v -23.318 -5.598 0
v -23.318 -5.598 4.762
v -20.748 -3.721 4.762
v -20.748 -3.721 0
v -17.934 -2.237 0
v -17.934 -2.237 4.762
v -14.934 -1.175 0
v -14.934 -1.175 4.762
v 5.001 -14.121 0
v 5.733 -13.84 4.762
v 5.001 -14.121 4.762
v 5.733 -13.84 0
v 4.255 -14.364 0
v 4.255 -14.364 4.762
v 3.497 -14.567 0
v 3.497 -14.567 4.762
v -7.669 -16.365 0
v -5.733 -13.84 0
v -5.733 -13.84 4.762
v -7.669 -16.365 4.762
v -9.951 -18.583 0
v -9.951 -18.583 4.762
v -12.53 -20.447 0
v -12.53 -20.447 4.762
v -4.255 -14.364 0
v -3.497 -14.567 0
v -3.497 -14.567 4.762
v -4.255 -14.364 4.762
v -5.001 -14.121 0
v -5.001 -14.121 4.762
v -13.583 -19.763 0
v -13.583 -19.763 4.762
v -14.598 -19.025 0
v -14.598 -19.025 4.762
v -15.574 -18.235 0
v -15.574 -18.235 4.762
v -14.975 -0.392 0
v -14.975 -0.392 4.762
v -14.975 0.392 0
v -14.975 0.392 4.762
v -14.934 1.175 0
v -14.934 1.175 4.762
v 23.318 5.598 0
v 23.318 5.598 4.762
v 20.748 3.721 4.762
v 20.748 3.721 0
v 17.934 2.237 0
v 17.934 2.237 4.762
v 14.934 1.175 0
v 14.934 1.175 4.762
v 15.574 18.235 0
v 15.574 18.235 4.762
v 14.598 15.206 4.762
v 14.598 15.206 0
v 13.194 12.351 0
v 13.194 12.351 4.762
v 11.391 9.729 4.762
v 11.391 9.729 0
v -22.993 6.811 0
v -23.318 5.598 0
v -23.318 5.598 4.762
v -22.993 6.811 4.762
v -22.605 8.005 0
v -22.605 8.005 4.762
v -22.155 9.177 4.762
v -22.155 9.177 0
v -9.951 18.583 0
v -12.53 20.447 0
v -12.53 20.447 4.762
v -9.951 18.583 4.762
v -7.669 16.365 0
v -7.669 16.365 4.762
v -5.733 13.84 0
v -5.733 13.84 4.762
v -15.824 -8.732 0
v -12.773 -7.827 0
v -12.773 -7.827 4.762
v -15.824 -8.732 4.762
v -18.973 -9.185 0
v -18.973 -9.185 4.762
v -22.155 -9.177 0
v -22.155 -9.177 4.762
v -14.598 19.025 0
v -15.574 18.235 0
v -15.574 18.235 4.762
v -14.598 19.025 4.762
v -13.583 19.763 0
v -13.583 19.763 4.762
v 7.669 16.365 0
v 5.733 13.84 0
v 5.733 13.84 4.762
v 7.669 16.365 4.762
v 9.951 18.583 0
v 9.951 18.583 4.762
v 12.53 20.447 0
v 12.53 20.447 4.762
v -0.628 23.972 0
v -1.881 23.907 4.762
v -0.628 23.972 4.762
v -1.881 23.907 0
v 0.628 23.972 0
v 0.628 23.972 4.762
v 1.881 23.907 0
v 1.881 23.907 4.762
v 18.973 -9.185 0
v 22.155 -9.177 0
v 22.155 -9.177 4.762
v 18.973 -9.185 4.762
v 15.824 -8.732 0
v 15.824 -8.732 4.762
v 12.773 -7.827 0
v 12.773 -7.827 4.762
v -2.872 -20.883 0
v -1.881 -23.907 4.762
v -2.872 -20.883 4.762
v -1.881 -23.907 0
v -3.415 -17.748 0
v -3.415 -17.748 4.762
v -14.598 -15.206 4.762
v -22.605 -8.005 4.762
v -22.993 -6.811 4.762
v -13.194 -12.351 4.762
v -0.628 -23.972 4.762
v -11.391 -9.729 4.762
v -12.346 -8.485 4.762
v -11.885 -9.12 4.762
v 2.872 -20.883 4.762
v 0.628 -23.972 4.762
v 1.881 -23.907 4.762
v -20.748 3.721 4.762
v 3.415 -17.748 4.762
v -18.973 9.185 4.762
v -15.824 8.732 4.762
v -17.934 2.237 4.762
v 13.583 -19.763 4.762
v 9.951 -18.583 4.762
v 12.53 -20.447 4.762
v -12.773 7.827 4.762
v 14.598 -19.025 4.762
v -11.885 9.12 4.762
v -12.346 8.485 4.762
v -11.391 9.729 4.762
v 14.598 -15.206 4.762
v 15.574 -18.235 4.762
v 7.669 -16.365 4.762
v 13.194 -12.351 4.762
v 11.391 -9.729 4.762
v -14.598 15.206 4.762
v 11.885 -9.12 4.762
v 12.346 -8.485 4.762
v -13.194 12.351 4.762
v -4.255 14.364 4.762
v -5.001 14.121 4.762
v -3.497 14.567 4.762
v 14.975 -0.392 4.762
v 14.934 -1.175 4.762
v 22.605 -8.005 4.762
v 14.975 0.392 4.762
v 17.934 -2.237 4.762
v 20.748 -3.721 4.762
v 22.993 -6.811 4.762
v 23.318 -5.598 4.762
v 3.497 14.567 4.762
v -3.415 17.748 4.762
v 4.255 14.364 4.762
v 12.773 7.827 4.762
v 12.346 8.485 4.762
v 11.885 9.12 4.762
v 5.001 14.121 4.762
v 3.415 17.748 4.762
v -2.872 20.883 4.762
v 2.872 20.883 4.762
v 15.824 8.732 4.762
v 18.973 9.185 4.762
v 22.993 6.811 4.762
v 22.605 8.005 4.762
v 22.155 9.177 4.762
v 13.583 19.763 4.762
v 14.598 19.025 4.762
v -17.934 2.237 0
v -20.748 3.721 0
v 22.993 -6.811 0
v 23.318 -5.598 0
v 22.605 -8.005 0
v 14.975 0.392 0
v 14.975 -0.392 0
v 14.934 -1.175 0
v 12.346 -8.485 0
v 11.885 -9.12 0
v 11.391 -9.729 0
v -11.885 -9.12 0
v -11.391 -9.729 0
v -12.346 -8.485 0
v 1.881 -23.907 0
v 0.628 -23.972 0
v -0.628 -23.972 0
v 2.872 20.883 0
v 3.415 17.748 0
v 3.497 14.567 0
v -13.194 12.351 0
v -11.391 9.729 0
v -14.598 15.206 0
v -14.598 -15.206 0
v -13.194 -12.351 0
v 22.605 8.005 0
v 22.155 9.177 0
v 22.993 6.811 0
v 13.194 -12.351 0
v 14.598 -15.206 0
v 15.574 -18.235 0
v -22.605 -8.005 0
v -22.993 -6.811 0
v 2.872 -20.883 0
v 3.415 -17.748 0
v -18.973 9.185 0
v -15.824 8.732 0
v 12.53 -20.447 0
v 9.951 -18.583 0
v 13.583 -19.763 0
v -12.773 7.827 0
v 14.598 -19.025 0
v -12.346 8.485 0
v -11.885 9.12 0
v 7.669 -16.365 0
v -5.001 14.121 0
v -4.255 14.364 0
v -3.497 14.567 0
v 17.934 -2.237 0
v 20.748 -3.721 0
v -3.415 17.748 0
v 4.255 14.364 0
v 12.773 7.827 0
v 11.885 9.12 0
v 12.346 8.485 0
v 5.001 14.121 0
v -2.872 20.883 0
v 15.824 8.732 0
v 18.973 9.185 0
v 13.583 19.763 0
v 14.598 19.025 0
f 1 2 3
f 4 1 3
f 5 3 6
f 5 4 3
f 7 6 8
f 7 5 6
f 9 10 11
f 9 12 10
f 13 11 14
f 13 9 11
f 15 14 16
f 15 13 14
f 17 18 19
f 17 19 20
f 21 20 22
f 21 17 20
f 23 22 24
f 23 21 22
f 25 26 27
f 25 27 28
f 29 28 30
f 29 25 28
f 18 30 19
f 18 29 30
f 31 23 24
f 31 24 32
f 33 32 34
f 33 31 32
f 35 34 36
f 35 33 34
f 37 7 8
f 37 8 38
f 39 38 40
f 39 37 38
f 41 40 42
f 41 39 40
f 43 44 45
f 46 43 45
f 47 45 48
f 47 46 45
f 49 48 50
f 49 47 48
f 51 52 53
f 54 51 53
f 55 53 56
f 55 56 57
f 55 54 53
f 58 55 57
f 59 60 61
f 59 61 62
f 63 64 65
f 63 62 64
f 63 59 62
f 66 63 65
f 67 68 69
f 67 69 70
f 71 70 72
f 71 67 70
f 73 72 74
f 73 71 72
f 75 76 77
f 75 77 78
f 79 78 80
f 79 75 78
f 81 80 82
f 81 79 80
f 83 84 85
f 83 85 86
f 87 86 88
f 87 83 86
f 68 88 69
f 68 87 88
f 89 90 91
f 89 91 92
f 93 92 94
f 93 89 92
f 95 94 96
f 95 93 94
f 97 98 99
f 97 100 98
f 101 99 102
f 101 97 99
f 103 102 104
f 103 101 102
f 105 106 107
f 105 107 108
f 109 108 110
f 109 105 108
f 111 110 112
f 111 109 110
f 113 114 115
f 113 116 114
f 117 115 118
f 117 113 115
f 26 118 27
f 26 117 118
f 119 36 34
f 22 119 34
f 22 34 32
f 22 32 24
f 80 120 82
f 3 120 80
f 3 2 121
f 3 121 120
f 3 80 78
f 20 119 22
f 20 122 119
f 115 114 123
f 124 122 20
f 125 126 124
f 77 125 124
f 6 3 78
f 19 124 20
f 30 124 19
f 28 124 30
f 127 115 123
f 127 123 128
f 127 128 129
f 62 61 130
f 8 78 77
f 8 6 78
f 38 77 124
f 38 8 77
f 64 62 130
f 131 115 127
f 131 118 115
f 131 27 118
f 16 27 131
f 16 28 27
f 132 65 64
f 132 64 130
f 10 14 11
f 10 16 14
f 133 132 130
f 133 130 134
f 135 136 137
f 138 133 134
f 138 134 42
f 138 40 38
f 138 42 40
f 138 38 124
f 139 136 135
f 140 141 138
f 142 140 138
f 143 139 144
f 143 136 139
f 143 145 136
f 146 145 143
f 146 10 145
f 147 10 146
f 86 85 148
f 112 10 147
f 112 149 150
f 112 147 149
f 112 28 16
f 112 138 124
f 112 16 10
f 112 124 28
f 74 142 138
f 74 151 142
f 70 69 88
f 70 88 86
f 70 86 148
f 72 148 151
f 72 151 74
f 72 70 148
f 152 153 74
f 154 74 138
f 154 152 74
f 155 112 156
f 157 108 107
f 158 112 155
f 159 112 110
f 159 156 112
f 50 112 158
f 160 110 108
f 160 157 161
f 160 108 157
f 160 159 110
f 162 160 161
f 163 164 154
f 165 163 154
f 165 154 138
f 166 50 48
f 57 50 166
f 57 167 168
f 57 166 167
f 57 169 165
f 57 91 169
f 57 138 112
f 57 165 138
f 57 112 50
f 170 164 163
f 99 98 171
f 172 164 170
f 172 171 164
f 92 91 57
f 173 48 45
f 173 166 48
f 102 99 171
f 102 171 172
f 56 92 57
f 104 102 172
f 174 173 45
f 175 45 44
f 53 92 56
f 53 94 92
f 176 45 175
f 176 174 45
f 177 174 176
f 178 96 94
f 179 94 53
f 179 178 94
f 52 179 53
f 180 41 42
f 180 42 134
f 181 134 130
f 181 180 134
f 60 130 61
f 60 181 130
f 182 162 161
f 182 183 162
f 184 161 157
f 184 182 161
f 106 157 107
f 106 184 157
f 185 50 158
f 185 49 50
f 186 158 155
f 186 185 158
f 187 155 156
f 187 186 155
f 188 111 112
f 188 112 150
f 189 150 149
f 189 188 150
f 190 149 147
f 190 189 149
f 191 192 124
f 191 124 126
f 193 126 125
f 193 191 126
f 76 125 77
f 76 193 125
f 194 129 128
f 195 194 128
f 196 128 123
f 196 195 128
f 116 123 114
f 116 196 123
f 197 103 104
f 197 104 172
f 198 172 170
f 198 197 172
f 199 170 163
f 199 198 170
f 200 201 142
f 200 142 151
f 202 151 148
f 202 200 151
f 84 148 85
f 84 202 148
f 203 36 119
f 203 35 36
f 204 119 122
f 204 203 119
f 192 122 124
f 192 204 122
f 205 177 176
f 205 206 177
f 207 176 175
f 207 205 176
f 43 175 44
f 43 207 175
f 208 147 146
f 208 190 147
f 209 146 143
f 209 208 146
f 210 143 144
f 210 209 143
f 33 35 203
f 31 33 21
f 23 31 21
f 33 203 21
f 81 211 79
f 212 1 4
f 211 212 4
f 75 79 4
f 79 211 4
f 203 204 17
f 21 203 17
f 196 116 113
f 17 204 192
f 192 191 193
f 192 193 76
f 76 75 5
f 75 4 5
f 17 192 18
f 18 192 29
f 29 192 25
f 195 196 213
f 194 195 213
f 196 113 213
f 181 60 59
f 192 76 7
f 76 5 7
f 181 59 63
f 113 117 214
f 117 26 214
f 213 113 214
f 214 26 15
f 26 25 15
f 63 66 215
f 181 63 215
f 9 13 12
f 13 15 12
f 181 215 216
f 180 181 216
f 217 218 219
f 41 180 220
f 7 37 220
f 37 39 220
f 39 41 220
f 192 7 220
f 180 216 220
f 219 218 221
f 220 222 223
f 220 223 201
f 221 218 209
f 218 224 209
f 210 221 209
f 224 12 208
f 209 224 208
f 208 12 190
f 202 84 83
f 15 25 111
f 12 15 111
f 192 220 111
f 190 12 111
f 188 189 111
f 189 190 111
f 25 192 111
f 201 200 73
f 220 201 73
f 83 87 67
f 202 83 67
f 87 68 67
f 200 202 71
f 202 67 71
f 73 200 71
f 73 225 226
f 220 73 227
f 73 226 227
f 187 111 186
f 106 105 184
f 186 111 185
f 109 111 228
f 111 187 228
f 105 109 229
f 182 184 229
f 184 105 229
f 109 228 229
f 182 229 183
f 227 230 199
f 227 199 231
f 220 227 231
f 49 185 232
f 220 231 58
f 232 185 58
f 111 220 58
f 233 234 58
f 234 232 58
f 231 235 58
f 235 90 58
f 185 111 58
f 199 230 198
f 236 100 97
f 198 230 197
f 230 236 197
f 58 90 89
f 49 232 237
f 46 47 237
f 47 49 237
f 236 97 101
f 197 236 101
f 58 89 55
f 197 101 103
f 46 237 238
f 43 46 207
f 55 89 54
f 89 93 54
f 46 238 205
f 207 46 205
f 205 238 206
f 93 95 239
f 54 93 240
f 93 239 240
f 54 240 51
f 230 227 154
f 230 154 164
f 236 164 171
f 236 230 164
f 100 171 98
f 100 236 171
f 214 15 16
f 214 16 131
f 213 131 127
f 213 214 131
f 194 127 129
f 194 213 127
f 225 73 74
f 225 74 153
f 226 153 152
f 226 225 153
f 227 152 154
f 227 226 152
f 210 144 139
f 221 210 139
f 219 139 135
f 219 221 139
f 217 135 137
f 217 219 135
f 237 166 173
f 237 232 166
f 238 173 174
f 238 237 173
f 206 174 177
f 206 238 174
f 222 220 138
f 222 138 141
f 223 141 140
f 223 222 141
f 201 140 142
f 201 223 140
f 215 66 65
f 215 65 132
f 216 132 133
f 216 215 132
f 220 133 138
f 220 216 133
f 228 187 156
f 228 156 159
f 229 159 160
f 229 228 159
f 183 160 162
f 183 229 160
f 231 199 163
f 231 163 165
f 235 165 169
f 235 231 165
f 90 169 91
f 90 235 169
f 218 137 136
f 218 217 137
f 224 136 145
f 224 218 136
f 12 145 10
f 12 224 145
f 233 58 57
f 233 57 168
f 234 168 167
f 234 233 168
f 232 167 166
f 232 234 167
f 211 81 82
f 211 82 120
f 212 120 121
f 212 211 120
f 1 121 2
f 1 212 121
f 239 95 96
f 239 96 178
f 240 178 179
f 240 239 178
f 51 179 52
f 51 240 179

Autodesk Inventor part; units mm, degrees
sketch "Sketch1" plane through (0, 0, 0) normal (0, 0, 1) x (1, 0, 0)
  circle A0 centre (0, 0) radius 23.9806
  dimension "d0" = 47.9612
extrude "Extrusion1" add sketch "Sketch1" along normal blind 4.7625
sketch "Sketch2" plane through (0, 0, 0) normal (0, 0, -1) x (-1, 0, 0)
  circle A0 centre (0, 0) radius 23.9806 projected
  circle A1 centre (0, 0) radius 20
  dimension "d3" = 40
surface extrude "Pitch Diameter" sketch "Sketch2" against normal through all shown no curves A1
ref_plane "Work Plane1" through (0, 0, 0) normal (1, 0, 0) x (0, 1, 0)
ref_plane "Work Plane2" through (0, 0, 0) normal (0.9510565, 0.309017, 0) x (0, 0, 1)
ref_plane "Work Plane3" through (0, 0, 2.3813) normal (0, 0, -1) x (-1, 0, 0)
spur gear teeth "Spur Gear" teeth 10 pitch diameter 40 tip diameter 47.9612 root diameter 29.9612 face width 4.7625 start plane through (0, 0, 0) normal (0, 0, -1) x (-1, 0, 0)
equation "\"d0\" = da_da"
equation "\"d1\" = da_b"
equation "\"d3\" = da_d"
equation "\"d15\" = da_aw"
equation "\"d19\" = da_aw"
equation "\"da_da\" = 47.961175"
equation "\"da_b\" = 4.7625"
equation "\"da_d\" = 40"
equation "\"da_aw\" = 746.76"
properties part number "PINION" material "Steel"
